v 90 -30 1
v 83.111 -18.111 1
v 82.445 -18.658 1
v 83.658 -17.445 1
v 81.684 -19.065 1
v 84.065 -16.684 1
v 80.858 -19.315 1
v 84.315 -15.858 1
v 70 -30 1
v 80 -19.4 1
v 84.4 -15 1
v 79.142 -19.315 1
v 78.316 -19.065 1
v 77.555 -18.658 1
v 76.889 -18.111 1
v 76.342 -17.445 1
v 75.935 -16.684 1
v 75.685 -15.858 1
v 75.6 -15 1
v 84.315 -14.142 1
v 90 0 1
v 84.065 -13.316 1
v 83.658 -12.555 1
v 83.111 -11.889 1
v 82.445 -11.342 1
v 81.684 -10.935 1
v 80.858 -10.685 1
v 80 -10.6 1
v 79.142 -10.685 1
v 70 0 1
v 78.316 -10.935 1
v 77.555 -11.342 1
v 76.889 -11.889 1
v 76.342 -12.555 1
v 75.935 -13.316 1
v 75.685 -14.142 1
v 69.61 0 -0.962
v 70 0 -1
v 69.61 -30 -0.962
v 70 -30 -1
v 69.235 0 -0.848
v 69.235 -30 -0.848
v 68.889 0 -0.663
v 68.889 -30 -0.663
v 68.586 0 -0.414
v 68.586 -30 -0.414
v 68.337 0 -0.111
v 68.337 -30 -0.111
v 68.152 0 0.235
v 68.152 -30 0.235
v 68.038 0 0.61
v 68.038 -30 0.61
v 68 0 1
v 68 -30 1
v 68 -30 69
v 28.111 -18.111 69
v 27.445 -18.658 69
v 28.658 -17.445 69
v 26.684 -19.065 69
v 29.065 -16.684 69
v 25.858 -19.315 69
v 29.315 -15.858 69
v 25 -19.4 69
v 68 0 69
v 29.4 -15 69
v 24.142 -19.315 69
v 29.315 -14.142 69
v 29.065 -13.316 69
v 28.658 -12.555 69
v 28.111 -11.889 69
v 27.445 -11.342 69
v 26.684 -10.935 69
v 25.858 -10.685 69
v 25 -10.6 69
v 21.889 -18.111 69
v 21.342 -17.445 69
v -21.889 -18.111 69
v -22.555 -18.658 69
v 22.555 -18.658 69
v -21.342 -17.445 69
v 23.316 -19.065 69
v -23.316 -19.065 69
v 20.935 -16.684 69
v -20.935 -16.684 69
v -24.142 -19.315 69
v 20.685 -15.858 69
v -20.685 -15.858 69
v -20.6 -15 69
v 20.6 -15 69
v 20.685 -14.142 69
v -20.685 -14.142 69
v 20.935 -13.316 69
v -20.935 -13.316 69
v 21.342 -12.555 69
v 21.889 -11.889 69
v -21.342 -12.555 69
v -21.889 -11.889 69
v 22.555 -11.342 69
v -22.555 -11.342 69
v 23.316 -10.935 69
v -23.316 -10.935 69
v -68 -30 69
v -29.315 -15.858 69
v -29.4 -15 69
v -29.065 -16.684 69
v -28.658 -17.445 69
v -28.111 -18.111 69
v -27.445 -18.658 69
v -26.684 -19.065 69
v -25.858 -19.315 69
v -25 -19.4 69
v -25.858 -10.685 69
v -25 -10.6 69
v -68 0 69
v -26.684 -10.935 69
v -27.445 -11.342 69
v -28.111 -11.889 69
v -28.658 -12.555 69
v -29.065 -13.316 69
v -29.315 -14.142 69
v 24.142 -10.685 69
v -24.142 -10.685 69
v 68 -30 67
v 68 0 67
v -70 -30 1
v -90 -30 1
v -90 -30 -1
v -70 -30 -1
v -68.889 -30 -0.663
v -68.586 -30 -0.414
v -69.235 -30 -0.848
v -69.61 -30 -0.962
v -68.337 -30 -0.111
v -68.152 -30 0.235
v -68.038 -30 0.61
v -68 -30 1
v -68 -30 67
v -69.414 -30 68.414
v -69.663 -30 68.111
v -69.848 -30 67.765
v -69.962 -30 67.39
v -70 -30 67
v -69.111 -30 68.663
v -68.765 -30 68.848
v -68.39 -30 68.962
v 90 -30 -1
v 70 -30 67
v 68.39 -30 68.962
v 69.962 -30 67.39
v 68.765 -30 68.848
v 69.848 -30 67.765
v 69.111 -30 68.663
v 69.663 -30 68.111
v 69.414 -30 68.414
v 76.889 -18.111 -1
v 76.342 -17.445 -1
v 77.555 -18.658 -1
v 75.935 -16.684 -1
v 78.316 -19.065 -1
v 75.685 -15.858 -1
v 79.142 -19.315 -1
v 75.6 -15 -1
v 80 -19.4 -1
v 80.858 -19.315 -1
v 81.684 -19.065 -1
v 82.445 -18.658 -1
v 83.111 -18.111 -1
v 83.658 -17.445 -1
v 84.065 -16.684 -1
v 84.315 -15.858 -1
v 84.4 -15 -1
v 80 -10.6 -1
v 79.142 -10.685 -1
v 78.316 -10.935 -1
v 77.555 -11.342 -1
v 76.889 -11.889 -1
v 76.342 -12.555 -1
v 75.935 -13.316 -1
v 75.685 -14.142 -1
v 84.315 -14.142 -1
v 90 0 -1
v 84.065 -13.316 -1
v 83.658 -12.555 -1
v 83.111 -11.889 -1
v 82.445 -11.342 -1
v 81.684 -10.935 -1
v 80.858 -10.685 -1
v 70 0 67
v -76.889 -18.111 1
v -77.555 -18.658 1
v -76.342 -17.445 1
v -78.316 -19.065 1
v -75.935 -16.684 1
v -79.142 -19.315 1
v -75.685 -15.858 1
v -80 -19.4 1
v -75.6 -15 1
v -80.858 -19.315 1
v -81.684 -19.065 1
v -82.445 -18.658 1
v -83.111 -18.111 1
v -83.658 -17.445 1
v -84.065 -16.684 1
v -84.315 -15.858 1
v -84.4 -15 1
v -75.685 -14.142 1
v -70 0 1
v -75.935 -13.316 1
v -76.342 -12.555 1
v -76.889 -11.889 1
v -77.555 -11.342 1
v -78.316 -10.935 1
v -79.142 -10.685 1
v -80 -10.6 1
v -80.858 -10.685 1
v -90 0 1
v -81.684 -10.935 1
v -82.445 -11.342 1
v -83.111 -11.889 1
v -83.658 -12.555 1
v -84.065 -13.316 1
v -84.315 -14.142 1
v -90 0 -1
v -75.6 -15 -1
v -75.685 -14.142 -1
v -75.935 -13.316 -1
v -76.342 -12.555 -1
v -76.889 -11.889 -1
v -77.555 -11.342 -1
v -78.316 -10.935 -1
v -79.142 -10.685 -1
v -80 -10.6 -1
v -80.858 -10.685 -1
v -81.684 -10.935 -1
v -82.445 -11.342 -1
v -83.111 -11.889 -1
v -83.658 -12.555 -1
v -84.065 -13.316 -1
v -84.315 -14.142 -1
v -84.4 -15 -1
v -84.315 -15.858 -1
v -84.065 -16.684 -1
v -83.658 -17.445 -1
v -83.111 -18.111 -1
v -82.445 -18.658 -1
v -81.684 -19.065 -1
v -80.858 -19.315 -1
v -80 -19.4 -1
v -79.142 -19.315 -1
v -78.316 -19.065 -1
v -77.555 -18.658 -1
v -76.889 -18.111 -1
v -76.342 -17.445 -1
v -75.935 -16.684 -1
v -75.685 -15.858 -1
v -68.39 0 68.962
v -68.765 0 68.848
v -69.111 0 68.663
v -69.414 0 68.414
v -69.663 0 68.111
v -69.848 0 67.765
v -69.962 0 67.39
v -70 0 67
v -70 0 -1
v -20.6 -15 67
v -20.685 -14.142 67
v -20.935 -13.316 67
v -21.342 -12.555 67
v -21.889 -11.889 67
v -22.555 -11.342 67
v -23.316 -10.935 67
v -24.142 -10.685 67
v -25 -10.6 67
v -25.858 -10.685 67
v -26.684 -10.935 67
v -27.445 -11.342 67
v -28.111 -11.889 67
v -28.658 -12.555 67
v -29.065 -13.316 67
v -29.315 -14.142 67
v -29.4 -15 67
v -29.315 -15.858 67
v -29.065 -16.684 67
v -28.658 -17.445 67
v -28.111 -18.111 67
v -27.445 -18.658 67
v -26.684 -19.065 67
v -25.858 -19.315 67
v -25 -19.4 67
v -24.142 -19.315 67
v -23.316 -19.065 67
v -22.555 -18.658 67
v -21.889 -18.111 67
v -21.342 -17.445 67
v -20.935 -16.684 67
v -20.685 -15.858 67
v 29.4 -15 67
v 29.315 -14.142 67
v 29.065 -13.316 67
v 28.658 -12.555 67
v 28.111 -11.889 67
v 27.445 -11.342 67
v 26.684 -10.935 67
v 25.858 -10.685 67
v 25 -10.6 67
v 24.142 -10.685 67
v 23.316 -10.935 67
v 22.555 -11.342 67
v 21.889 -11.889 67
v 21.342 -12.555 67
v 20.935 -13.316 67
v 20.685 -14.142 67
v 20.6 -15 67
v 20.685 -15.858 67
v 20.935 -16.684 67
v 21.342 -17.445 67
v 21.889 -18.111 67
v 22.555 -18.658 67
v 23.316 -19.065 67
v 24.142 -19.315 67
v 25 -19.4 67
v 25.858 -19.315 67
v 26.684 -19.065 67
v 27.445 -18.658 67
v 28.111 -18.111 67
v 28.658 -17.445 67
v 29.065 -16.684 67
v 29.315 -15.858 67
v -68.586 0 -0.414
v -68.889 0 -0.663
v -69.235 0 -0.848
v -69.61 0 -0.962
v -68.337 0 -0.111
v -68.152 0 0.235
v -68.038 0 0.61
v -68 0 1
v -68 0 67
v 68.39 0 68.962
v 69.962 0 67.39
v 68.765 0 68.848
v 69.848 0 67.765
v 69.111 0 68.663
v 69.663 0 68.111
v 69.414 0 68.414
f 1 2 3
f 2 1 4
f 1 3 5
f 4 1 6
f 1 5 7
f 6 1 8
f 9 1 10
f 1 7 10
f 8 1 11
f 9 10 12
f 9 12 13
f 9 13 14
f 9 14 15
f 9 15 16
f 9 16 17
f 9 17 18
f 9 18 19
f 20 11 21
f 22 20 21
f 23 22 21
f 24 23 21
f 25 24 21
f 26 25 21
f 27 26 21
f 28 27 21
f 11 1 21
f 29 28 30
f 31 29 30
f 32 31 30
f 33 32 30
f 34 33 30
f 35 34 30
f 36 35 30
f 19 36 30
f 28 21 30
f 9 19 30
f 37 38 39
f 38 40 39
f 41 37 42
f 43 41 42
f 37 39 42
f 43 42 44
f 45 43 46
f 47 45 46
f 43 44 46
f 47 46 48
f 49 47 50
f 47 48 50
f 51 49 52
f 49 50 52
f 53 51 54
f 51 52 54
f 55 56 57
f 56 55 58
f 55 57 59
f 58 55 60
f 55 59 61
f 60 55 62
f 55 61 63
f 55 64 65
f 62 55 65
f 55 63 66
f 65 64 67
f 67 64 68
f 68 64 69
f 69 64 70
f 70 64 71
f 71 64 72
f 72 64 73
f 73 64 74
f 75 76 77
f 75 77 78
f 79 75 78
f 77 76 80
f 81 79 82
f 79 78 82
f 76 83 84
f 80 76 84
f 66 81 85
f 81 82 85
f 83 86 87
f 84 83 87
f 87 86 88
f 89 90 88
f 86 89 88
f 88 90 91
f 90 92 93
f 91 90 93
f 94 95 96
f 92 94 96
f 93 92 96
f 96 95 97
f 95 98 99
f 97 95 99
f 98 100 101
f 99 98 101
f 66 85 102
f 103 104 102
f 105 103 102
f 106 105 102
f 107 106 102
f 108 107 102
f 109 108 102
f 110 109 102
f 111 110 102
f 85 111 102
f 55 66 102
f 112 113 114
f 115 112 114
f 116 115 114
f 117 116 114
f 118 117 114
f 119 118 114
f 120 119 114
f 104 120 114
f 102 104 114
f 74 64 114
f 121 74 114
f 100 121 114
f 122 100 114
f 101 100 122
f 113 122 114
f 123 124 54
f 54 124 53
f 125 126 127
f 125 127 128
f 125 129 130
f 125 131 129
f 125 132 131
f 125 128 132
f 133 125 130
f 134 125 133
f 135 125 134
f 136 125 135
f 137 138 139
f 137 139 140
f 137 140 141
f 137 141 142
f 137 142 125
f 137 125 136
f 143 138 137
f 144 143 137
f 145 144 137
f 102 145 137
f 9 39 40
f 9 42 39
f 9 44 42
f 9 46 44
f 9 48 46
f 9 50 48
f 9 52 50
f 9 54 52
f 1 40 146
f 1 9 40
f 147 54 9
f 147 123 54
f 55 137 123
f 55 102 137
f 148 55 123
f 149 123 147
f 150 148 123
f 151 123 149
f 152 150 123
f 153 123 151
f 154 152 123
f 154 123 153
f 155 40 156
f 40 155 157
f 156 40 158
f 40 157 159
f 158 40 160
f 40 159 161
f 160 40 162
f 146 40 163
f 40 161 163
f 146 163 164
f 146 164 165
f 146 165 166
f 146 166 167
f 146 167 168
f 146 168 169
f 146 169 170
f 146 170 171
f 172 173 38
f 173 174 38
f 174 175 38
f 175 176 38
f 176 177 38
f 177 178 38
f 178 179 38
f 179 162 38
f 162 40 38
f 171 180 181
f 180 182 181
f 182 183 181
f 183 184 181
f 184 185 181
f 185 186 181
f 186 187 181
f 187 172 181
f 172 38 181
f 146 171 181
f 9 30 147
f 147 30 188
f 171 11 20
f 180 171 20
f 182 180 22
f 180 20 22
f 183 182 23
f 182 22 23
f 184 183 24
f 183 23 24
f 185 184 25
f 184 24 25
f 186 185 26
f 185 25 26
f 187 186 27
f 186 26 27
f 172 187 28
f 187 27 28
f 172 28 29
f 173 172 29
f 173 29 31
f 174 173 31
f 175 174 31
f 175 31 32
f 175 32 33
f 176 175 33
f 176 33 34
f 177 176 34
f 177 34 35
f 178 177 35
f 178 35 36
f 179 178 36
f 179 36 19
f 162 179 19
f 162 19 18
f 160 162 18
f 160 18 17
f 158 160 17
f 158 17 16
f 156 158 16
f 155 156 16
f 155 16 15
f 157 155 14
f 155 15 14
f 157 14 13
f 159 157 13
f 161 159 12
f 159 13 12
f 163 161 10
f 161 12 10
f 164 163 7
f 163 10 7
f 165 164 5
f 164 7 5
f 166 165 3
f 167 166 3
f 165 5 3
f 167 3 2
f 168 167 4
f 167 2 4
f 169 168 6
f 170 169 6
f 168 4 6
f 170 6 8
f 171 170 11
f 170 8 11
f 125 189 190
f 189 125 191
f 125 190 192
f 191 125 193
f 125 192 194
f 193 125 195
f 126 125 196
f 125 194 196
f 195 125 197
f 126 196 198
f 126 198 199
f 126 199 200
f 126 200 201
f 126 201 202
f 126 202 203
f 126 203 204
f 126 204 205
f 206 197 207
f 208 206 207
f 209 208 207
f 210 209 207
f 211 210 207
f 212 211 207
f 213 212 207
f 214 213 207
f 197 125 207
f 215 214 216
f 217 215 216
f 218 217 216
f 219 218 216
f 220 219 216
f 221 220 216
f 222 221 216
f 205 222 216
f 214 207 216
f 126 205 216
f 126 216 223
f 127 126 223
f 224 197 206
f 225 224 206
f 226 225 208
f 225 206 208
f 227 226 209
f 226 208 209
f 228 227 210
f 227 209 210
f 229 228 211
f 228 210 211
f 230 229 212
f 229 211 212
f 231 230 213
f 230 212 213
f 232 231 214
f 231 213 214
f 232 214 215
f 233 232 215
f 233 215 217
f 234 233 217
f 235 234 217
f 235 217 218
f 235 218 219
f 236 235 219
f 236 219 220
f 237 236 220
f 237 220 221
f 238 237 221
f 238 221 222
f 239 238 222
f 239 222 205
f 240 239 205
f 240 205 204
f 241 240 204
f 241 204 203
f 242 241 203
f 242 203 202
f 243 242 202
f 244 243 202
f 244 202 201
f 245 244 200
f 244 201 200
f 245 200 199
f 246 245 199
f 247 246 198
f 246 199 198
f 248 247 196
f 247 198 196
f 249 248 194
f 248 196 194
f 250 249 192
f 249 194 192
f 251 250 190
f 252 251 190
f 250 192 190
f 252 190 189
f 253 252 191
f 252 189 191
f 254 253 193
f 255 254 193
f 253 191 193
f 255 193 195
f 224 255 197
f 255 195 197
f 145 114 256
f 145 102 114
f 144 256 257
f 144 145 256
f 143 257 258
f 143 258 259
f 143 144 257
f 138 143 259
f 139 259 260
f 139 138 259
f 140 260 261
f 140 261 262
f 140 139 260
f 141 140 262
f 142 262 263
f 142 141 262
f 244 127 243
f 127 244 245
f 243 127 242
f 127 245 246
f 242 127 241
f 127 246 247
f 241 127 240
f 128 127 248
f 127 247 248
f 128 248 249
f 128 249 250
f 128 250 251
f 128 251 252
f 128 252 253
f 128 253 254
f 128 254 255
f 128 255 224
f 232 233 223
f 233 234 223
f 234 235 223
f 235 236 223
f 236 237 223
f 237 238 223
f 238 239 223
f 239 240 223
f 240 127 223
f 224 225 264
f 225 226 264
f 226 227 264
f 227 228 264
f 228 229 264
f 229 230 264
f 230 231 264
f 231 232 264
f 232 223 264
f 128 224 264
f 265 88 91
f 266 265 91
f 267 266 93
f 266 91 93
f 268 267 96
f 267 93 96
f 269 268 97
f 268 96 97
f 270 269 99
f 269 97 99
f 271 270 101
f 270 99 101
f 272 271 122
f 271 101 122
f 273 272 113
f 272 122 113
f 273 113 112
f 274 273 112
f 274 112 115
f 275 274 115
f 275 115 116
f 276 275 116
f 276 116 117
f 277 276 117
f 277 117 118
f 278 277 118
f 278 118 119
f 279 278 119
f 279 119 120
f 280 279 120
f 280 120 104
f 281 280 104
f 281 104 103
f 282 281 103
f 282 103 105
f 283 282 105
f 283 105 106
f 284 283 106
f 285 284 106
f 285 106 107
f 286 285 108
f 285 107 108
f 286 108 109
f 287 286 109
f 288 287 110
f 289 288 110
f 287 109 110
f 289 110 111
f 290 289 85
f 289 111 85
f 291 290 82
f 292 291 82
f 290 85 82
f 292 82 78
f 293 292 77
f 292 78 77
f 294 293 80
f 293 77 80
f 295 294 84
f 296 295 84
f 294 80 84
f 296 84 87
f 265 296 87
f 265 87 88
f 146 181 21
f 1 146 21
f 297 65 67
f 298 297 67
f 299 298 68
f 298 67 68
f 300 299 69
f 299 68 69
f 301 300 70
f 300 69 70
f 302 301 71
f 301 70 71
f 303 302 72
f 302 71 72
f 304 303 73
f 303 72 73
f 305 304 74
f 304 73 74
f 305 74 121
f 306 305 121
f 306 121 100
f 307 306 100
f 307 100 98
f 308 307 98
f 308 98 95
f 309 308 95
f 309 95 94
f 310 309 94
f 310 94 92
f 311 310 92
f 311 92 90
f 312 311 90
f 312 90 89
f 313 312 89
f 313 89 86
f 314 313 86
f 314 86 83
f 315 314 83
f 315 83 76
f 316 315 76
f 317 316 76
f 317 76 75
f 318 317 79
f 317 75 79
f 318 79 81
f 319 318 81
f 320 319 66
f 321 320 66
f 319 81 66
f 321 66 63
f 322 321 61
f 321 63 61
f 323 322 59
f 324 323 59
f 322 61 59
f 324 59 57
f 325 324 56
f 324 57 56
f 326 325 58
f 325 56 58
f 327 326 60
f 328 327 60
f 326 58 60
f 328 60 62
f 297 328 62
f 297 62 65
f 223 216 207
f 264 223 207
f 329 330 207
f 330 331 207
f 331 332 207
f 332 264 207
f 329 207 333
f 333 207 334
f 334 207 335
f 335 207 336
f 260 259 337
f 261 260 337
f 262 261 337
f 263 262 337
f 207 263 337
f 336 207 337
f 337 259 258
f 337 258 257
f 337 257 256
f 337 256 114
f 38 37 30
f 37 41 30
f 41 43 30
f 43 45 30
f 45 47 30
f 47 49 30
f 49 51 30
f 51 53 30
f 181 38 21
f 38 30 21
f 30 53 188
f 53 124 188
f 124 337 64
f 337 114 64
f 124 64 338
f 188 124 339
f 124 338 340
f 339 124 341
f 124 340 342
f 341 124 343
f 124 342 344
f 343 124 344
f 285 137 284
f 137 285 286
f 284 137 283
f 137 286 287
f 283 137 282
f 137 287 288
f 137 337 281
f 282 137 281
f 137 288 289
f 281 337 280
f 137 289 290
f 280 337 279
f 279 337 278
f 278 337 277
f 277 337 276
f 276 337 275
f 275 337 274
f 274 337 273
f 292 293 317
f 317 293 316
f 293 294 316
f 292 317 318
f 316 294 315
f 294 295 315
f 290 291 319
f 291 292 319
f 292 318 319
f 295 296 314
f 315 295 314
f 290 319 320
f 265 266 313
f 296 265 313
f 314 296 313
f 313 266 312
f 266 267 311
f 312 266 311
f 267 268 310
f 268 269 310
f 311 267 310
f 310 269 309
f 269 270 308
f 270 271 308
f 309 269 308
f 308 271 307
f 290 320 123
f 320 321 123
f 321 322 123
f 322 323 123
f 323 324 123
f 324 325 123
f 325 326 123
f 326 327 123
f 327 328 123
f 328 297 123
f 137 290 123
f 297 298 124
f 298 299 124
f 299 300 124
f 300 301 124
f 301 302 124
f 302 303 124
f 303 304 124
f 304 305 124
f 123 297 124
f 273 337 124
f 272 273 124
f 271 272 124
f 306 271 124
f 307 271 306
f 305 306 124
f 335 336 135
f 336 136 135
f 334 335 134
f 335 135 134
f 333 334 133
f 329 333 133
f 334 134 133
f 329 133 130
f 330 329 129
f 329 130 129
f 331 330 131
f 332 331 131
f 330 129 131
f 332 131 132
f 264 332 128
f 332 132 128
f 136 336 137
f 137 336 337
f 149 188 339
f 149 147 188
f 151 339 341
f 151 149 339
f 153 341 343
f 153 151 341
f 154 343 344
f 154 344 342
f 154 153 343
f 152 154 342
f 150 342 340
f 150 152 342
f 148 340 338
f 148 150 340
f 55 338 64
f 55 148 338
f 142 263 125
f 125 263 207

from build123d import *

# Parameters (mm, degrees)
F1_DEPTH = 30
F2_R     = 4.4
F3_R     = 4.4
F4_DEPTH = 25
F5_R     = 2
F6_R     = 2


# Not quite as in the source:
# - a feature names something its author has since deleted; it is built from what else it names


with BuildPart() as f1:
    # F0 (on Front) → F1 (new body)
    with BuildSketch(Plane.XZ):
        Polygon((90, -1), (90, 1), (70, 1), (70, 69), (-70, 69), (-70, 1), (-90, 1), (-90, -1), (-68, -1), (-68, 67), (68, 67), (68, -1), align=None)
    extrude(amount=F1_DEPTH)

    # F2 (on face) + F3 (on face) → F4 (cut)
    with BuildSketch(Plane.XY.offset(1)):
        with Locations((-80, -15)):
            Circle(F2_R)
        with Locations((80, -15)):
            Circle(F2_R)
    with BuildSketch(Plane.XY.offset(69)):
        with Locations((-25, -15)):
            Circle(F3_R)
        with Locations((25, -15)):
            Circle(F3_R)
    extrude(amount=-F4_DEPTH, mode=Mode.SUBTRACT)

    # F5
    f5_edges = [f1.edges().sort_by_distance(p)[0] for p in [
        (-70, -15, 69),
        (70, -15, 69),
    ]]
    fillet(f5_edges, radius=F5_R)

    # F6
    f6_edges = [f1.edges().sort_by_distance(p)[0] for p in [
        (68, -15, -1),
        (-68, -15, -1),
    ]]
    fillet(f6_edges, radius=F6_R)


solid = f1.part
